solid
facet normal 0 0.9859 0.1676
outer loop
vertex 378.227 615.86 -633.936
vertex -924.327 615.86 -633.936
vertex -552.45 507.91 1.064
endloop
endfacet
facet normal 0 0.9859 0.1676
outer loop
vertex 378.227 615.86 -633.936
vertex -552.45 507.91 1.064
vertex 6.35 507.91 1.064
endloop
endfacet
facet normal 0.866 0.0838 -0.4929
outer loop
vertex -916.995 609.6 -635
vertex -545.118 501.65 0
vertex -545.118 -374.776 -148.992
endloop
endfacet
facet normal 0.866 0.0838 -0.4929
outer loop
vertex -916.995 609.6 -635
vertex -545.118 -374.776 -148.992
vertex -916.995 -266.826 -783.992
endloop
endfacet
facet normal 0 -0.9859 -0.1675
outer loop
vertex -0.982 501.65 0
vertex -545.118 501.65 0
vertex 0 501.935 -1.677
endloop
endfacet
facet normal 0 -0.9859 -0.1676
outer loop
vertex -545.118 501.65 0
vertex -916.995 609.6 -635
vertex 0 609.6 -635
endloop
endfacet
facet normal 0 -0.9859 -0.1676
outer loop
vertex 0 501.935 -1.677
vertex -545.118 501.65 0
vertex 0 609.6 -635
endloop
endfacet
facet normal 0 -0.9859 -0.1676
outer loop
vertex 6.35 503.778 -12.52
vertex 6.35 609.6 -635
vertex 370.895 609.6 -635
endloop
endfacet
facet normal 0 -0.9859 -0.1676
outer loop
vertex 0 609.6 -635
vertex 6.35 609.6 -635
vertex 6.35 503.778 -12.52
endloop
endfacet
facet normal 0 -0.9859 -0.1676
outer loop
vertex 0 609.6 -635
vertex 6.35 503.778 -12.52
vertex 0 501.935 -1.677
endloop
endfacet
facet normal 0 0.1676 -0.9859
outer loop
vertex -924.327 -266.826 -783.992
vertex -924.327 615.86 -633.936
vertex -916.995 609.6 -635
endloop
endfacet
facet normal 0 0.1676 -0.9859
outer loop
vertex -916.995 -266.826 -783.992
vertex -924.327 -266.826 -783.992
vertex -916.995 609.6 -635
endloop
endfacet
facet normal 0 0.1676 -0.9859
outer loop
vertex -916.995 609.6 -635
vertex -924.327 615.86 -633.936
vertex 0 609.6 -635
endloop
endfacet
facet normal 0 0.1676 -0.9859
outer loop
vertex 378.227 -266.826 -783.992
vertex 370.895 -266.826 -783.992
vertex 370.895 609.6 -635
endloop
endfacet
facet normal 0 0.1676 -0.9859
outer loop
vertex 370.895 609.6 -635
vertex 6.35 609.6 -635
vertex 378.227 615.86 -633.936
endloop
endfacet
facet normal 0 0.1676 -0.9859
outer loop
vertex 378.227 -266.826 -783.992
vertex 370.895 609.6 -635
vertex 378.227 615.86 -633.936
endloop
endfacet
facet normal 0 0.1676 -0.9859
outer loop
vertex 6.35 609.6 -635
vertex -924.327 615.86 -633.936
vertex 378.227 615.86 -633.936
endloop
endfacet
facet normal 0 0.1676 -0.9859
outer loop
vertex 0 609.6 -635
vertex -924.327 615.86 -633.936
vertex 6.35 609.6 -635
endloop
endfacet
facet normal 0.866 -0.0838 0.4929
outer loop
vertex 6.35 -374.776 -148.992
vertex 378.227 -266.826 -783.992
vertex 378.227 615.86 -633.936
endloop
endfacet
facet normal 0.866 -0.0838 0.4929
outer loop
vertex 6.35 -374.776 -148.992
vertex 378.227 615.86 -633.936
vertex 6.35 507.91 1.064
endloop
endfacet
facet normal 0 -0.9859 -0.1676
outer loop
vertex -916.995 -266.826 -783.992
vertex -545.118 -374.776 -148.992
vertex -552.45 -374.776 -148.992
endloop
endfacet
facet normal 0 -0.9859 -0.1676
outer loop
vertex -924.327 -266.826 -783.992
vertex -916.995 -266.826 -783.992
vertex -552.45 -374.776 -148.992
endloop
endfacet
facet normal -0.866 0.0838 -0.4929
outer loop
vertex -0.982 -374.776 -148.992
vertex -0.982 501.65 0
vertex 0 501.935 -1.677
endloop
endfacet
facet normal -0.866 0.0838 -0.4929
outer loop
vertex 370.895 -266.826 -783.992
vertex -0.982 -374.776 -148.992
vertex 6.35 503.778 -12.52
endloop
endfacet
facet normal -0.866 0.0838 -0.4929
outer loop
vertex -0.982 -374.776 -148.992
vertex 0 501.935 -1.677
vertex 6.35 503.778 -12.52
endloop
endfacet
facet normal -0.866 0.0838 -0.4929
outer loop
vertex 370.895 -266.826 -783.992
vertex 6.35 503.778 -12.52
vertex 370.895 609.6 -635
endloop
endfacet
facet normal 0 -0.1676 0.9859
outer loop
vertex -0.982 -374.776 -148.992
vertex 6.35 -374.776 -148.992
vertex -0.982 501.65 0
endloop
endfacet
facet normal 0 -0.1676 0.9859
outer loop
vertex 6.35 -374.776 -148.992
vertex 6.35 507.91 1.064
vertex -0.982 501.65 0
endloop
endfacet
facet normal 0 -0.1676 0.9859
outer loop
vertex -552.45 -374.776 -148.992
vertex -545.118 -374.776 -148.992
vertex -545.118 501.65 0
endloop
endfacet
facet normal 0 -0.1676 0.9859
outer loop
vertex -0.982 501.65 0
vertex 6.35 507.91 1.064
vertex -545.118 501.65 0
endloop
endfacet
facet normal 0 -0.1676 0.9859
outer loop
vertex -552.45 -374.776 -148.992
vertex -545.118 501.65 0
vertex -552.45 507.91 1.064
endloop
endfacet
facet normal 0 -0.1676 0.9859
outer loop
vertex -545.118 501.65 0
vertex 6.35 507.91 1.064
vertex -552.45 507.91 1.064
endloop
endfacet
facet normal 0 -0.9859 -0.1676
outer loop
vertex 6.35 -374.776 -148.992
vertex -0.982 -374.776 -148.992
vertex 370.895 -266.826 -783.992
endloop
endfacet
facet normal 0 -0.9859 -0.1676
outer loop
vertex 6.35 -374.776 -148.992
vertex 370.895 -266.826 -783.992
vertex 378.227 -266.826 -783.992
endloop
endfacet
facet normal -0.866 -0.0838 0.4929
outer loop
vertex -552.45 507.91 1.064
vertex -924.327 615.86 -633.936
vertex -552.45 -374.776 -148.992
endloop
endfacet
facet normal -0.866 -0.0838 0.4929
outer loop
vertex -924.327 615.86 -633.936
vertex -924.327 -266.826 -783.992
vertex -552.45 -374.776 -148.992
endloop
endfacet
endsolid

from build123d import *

# Parameters (mm, degrees)
BOSS_EXTRUDE1_DEPTH = 6.35
BOSS_EXTRUDE2_DEPTH = 6.35
CUT_EXTRUDE2_REACH  = 932.677
BOSS_EXTRUDE3_DEPTH = 889


with BuildPart() as part:
    # Sketch3 → Boss-Extrude1 (new body)
    with BuildSketch(Plane(origin=(0, 0, 0), x_dir=(0, 0, -1), z_dir=(1, 0, 0))):
        Polygon((0, 0), (635, 0), (635, 609.6), (0, 501.65), align=None)
    extrude(amount=BOSS_EXTRUDE1_DEPTH)

    # Sketch5 → Boss-Extrude2 (add)
    with BuildSketch(Plane(origin=(0, 487.559529595, 82.885120031), x_dir=(1, 0, 0), z_dir=(0, 0.985855847, 0.167595494))):
        Polygon((6.35, 84.074279532), (378.227310637, 728.184675737), (-924.327310637, 728.184675737), (-552.45, 84.074279532), align=None)
    extrude(amount=BOSS_EXTRUDE2_DEPTH)

    # Sketch10 → Cut-Extrude2 (cut, up to next)
    with BuildSketch(Plane(origin=(6.35, 0, 0), x_dir=(0, 0, -1), z_dir=(1, 0, 0)), mode=Mode.PRIVATE) as cut_extrude2_sk1:
        Polygon((0, 501.65), (0, 0), (635, 0), (635, 609.6), align=None)
    cut_extrude2_tool1 = extrude(cut_extrude2_sk1.sketch, amount=-CUT_EXTRUDE2_REACH, mode=Mode.PRIVATE) & part.part
    add(cut_extrude2_tool1.solids().sort_by_distance((6.35, 278.686381, -327.780952))[0], mode=Mode.SUBTRACT)

    # Sketch9 → Boss-Extrude3 (add)
    with BuildSketch(Plane(origin=(0, 487.559529595, 82.885120031), x_dir=(1, 0, 0), z_dir=(0, -0.985855847, -0.167595494))):
        Polygon((378.227310637, -728.184675737), (6.35, -84.074279532), (-0.982348419, -84.074279532), (370.894962218, -728.184675737), align=None)
        Polygon((-924.327310637, -728.184675737), (-552.45, -84.074279532), (-545.117651581, -84.074279532), (-916.994962218, -728.184675737), align=None)
    extrude(amount=BOSS_EXTRUDE3_DEPTH)


solid = part.part
